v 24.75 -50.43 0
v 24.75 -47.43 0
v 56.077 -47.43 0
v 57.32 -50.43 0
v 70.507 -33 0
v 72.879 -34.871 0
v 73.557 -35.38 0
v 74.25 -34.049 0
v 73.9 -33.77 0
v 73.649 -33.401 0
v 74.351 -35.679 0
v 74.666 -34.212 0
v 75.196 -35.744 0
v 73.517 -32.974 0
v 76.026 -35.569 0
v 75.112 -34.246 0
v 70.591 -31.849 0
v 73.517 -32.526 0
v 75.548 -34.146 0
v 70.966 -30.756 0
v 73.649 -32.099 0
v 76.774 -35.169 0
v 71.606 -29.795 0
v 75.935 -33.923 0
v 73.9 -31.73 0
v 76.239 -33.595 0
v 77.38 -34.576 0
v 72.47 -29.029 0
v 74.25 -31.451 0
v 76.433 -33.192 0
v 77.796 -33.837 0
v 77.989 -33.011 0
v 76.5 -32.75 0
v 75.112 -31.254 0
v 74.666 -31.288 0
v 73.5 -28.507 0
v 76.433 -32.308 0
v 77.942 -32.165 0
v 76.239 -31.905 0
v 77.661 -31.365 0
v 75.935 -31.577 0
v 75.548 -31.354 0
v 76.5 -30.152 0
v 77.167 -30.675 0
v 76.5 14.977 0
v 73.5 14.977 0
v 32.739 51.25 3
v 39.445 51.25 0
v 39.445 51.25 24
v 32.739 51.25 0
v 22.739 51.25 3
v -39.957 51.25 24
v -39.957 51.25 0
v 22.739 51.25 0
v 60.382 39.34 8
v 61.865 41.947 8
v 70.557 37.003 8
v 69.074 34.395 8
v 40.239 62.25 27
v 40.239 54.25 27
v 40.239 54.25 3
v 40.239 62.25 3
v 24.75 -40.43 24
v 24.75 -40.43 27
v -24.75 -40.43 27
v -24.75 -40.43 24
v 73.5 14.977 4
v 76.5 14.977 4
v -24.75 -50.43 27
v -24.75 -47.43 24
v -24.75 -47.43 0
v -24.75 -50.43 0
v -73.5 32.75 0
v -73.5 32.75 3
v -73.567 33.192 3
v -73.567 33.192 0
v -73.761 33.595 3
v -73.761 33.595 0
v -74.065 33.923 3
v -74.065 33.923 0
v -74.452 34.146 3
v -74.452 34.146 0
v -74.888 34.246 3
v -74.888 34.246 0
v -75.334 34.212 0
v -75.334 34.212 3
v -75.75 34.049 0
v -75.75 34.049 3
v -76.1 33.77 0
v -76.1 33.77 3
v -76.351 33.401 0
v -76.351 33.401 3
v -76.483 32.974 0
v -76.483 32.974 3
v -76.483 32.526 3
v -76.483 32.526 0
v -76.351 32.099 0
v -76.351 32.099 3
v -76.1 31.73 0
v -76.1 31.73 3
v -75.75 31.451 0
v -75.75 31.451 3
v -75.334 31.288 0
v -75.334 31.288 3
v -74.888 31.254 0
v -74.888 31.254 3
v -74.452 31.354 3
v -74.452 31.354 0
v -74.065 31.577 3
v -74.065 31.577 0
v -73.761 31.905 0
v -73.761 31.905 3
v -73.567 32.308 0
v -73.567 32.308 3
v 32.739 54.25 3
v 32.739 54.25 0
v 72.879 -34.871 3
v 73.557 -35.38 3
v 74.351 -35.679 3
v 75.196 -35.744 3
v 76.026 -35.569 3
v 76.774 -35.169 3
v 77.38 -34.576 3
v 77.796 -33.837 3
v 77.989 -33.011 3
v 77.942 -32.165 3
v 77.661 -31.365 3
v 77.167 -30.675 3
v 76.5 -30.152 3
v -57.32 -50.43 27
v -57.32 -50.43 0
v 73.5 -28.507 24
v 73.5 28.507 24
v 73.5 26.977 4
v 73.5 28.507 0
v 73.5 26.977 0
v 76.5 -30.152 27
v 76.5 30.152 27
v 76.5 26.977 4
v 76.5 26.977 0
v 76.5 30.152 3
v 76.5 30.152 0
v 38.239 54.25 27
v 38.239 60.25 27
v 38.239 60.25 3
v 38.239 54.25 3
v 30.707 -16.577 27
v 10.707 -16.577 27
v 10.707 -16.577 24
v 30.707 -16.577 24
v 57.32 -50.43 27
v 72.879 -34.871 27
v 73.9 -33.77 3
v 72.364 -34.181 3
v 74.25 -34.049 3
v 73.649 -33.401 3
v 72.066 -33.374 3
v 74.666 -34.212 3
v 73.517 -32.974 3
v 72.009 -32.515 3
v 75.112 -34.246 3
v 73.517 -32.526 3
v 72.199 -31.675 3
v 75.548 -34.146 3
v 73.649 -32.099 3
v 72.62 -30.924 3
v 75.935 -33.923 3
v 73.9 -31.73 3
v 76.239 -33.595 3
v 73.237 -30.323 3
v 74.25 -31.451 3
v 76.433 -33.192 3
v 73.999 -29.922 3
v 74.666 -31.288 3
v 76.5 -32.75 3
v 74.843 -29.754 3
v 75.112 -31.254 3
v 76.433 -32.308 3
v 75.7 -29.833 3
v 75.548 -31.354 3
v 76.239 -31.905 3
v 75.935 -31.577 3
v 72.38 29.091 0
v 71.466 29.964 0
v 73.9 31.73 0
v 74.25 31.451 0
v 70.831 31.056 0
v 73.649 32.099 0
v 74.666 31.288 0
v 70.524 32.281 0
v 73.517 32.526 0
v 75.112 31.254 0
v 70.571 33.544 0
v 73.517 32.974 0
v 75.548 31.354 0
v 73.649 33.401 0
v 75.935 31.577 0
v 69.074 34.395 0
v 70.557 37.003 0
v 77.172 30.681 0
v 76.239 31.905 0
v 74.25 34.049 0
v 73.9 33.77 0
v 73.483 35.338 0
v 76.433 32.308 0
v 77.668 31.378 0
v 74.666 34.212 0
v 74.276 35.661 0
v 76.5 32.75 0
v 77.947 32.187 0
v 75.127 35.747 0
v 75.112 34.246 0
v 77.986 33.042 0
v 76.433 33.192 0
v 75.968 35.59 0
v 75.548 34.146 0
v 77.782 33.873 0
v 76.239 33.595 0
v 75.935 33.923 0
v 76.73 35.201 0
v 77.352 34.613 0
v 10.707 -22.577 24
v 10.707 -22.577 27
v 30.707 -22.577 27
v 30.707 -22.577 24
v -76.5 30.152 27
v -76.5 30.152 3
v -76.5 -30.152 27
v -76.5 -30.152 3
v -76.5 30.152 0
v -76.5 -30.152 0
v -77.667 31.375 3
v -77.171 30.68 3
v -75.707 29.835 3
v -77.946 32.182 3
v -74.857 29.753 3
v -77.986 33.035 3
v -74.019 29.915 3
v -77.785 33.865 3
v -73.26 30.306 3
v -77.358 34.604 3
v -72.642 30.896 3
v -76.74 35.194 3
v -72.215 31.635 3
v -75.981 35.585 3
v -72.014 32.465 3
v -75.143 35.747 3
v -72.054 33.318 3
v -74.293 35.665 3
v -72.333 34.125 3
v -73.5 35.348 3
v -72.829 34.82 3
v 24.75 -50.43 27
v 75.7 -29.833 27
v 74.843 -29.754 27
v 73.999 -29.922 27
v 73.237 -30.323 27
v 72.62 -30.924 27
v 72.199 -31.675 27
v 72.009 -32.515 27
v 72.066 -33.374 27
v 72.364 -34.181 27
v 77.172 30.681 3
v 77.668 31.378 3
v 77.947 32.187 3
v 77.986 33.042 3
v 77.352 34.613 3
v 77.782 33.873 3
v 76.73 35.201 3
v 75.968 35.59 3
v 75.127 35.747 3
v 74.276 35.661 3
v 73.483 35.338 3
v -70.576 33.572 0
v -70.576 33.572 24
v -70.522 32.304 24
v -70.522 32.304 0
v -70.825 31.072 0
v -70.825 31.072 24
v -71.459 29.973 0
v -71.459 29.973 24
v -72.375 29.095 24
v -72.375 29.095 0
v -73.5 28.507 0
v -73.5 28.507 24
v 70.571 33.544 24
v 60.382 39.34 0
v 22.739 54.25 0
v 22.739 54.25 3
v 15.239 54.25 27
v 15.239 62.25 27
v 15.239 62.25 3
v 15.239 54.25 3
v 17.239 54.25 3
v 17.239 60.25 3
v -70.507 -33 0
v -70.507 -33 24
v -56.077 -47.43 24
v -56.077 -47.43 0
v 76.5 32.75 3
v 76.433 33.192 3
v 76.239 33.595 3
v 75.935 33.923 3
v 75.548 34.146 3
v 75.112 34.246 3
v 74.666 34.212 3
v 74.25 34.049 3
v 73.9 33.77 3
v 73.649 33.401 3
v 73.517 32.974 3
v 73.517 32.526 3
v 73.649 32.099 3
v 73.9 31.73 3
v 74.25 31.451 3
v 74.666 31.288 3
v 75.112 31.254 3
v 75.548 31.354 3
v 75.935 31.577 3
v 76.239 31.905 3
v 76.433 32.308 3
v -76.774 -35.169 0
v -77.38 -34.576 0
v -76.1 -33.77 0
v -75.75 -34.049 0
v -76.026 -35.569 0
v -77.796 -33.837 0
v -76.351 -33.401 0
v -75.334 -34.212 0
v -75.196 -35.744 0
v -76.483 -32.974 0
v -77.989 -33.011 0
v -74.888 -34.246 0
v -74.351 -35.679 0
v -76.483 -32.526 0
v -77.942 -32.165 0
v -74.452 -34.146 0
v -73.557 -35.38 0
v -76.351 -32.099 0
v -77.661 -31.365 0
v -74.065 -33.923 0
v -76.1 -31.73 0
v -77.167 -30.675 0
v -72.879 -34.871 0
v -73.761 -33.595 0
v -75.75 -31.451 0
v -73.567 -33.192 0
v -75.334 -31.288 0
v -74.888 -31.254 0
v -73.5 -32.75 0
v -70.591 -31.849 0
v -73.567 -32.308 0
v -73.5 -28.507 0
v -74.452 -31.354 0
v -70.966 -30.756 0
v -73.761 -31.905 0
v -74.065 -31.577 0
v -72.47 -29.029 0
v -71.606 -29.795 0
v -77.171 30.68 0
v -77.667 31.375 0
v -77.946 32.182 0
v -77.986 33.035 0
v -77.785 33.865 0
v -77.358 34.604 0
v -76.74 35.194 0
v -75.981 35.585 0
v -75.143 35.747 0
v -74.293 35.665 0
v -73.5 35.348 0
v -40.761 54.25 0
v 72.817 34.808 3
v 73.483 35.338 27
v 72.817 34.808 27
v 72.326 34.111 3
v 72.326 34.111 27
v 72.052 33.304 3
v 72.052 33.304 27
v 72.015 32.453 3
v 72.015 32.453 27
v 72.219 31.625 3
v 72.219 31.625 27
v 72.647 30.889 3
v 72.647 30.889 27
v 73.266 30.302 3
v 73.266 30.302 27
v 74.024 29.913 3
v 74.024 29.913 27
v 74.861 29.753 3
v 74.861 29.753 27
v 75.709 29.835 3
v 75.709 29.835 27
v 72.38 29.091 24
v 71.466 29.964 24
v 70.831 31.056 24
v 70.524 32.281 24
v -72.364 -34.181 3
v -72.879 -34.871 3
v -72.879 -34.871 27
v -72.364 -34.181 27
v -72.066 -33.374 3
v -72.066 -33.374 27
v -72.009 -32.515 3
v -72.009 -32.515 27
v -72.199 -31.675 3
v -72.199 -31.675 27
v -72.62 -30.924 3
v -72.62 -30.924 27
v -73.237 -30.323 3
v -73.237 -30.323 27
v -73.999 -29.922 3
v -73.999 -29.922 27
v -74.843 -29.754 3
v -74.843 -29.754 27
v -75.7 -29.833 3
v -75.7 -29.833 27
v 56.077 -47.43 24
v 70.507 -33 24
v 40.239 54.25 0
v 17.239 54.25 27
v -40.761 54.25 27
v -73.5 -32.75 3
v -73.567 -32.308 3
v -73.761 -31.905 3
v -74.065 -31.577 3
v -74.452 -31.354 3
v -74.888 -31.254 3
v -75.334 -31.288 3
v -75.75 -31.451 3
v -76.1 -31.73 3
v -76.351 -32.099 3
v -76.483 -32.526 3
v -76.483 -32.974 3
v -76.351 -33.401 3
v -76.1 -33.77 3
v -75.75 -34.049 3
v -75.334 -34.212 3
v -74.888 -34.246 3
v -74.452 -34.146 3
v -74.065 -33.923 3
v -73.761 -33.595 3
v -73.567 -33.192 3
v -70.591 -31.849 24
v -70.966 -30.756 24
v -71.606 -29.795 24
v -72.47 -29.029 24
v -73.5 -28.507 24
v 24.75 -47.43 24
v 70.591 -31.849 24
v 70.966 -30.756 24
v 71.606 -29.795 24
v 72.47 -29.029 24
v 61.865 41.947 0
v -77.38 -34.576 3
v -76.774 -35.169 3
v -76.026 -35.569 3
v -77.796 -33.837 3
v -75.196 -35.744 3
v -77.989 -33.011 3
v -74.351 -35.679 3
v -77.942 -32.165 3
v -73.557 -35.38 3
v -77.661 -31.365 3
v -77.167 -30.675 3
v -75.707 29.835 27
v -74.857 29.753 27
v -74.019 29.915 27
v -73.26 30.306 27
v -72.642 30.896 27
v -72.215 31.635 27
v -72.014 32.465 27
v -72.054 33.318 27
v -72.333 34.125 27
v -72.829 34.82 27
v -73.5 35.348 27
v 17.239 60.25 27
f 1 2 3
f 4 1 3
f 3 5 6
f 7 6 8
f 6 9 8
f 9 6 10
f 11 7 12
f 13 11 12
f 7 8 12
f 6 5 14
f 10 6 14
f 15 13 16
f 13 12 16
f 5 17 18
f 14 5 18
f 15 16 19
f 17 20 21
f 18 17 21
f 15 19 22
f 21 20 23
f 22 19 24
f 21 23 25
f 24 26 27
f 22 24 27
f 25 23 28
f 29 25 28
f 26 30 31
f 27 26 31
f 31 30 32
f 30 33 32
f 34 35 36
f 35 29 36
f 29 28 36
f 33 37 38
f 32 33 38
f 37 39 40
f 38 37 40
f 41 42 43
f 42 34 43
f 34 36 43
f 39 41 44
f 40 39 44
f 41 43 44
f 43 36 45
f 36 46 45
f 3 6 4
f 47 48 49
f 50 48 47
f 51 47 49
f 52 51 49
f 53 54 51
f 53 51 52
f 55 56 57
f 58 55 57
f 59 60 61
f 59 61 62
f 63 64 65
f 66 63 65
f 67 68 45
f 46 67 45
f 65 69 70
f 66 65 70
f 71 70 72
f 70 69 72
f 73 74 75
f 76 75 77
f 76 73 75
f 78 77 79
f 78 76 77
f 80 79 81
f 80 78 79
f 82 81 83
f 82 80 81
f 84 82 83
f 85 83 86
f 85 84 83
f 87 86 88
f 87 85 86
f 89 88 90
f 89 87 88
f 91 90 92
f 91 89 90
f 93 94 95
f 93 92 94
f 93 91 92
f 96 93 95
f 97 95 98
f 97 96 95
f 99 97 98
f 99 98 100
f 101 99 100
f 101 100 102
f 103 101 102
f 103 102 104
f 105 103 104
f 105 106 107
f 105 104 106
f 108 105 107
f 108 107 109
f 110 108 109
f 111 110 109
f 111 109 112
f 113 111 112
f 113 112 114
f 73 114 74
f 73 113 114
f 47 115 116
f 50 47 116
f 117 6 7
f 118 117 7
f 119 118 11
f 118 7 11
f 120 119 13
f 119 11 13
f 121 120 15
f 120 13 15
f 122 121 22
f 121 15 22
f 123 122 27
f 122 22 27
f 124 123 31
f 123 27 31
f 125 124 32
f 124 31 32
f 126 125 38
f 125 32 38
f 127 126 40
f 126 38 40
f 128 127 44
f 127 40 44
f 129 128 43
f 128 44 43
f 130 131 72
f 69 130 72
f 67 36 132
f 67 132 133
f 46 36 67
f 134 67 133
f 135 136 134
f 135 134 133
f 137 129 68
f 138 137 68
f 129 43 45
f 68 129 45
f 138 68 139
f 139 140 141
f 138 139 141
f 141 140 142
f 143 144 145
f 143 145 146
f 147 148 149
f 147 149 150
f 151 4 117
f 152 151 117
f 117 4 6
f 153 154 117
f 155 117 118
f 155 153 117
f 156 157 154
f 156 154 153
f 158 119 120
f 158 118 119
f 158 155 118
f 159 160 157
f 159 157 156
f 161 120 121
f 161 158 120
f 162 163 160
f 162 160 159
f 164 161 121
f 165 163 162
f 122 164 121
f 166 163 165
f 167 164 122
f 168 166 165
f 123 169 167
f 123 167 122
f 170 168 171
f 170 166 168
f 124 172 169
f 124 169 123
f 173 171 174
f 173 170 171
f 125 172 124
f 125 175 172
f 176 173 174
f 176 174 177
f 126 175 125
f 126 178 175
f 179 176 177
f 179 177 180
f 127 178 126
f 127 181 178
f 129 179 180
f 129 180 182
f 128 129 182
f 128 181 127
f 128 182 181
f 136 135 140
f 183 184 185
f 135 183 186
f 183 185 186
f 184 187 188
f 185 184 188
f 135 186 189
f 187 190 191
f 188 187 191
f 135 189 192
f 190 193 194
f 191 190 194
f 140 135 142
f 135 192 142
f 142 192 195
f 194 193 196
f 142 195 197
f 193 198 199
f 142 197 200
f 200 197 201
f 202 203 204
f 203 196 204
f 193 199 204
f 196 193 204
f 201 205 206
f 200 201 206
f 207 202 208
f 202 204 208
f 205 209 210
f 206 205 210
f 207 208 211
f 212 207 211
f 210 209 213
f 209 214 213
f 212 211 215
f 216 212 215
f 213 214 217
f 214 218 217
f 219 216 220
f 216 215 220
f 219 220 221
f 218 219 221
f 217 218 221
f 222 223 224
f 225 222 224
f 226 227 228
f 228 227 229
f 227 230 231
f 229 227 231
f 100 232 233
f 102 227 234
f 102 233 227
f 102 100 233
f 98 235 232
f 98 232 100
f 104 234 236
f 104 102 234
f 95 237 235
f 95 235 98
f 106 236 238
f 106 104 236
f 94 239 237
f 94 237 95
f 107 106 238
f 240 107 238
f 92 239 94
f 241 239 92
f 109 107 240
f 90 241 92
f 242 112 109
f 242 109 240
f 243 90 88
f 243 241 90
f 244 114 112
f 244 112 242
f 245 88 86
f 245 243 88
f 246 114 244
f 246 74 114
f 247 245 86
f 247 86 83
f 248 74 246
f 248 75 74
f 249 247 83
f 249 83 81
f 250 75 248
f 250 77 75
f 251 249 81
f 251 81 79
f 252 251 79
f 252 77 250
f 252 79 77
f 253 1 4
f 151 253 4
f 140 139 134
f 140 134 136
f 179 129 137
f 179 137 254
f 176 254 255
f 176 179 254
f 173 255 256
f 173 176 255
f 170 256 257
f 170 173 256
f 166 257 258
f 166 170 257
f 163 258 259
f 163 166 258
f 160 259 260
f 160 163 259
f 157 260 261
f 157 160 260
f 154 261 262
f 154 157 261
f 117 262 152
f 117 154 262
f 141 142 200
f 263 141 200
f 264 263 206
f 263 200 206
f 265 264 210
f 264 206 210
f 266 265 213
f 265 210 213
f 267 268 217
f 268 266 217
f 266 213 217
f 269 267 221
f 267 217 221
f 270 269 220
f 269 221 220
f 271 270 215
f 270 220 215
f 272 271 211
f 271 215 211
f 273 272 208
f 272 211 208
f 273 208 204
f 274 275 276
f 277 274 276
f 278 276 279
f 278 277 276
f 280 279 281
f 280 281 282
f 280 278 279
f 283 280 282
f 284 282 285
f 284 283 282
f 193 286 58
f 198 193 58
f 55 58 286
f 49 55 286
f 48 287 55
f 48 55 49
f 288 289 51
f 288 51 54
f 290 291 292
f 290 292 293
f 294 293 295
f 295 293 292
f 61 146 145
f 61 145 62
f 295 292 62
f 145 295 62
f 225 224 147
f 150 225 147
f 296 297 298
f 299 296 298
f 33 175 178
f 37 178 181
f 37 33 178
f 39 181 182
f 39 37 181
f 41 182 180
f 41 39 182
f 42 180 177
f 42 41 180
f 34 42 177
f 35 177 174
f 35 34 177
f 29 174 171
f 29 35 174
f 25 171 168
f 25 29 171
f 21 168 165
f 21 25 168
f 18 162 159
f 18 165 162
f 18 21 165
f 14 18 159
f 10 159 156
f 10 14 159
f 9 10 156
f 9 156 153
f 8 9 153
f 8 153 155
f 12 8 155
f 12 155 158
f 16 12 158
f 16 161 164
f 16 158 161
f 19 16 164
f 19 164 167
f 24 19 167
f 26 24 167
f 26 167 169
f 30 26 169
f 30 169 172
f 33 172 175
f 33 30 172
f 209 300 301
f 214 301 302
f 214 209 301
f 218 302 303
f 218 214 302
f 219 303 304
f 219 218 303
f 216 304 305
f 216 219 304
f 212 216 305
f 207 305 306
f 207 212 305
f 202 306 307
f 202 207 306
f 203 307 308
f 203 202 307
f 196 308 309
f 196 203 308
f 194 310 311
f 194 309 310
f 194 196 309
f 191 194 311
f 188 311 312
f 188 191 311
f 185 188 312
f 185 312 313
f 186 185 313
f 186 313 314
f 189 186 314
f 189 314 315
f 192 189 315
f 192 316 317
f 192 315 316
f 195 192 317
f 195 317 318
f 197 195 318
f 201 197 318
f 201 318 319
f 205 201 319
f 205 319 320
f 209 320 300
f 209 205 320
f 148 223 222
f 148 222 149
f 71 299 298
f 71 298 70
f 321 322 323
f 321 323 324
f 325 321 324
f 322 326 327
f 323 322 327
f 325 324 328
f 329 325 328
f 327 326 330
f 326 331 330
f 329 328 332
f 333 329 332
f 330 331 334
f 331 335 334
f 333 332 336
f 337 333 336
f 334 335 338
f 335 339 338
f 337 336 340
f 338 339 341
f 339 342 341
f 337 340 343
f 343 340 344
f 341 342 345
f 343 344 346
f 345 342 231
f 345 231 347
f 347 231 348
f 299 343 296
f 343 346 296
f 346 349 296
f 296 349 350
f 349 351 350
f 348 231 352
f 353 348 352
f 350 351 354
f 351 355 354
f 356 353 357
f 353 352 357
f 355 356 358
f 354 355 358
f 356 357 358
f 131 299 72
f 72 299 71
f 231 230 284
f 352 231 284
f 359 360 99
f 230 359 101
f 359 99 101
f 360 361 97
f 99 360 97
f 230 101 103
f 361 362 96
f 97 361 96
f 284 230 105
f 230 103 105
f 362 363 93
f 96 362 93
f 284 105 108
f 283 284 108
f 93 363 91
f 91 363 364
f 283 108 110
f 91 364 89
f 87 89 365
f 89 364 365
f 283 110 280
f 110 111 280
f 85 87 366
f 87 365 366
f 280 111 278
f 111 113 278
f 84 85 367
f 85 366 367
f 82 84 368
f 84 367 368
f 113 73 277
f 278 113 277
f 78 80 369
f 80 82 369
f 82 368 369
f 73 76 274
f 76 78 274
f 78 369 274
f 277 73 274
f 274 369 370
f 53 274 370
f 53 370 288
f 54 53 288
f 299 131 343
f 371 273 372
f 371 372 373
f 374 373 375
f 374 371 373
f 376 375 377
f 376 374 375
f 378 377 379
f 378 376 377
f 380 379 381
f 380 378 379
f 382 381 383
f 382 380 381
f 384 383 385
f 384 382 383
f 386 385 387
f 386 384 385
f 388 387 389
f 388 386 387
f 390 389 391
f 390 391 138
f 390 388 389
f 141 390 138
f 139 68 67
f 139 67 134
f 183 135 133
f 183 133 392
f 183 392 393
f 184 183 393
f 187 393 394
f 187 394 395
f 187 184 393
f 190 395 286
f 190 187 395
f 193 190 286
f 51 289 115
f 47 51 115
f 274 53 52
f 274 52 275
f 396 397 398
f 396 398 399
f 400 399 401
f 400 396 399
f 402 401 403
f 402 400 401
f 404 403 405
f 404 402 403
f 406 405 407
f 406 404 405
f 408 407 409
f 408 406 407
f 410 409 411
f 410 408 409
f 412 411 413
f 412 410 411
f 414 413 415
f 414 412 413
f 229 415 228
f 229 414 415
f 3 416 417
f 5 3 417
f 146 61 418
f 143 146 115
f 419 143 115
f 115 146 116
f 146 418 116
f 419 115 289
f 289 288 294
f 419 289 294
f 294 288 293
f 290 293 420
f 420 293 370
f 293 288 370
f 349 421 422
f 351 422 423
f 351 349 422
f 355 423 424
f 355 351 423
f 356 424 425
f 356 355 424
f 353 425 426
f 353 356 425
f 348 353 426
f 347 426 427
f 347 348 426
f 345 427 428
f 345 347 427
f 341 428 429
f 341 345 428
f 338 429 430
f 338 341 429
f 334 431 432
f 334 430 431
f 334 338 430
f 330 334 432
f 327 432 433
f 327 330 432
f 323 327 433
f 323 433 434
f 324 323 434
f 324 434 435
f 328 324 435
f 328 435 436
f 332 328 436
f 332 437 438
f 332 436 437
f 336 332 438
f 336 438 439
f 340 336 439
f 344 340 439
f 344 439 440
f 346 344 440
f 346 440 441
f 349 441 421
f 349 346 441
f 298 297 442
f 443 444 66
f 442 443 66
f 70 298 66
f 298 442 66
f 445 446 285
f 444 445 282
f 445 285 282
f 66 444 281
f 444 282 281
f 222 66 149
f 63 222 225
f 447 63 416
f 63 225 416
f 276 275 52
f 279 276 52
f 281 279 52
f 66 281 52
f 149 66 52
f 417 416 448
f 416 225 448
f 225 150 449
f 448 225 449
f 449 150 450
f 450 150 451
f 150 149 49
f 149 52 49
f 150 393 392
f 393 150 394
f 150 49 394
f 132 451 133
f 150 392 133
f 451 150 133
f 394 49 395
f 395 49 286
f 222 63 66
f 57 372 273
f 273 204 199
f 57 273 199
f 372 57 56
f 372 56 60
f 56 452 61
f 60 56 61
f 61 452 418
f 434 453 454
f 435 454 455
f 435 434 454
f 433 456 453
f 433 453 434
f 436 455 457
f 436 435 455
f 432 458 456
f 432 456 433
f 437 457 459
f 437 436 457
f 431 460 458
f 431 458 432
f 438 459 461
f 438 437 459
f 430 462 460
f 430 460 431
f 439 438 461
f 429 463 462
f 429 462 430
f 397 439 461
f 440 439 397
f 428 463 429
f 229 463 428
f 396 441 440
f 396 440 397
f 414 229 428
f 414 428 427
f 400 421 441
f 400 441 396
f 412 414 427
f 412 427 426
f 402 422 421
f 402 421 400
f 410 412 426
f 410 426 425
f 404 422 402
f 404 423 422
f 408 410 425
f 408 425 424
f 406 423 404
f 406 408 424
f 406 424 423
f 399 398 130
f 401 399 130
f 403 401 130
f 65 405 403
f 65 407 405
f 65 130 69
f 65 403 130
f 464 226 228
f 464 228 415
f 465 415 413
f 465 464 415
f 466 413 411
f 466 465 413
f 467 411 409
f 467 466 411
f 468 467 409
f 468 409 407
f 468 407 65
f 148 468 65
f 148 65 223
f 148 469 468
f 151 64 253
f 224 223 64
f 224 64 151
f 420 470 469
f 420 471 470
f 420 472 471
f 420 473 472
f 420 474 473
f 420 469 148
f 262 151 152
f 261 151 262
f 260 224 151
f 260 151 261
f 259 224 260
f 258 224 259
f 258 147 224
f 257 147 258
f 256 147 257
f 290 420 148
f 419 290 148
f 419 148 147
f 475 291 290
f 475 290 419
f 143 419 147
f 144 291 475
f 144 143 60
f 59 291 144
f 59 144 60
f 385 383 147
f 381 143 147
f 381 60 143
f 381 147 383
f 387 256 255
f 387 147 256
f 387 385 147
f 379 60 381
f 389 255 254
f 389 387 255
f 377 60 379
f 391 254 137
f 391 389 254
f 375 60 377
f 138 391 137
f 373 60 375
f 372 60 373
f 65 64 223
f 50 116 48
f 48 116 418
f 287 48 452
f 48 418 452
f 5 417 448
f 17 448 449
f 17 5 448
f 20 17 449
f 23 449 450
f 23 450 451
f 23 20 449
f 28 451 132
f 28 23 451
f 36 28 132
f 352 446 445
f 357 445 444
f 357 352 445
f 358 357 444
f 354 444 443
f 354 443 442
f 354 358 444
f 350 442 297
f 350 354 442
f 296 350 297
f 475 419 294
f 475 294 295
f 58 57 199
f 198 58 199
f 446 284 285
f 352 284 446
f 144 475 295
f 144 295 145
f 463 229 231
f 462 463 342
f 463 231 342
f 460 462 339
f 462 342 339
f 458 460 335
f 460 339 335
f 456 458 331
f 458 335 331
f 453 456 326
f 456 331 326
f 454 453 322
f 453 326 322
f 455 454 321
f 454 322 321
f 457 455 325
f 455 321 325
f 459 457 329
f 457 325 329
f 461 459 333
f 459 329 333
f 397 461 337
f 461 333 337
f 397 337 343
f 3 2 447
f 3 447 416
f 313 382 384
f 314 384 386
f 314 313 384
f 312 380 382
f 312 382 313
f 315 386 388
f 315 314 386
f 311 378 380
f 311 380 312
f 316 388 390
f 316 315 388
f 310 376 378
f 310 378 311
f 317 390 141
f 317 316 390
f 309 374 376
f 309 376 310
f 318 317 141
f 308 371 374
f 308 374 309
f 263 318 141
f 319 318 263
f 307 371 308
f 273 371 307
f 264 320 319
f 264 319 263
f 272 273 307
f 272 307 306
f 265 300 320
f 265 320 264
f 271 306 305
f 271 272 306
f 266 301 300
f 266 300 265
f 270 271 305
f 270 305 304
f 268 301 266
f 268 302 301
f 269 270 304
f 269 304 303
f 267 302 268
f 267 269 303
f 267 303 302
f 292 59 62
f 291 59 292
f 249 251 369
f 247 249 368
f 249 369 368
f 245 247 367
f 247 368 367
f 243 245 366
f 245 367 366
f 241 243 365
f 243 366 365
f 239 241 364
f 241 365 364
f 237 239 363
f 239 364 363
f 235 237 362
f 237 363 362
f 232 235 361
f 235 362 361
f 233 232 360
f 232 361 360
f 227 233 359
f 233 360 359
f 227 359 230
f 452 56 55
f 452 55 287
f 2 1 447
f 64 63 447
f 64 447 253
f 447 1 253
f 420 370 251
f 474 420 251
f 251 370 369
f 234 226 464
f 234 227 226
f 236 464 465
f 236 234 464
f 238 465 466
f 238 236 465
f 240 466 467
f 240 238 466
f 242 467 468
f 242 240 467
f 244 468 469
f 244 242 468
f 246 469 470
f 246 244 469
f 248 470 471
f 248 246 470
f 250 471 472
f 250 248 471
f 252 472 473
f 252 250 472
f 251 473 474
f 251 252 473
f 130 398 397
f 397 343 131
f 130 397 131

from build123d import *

# Parameters (mm, degrees)
SKETCH_2_R          = 1.5
EXTRUDE_1_DEPTH     = 27
SHELL_1_DEPTH       = 24
CUT_EXTRUDE_START   = -24
SKETCH_3_R          = 3
CUT_EXTRUDE_1_DEPTH = 24
SKETCH_5_W          = 20
SKETCH_5_H          = 6
CUT_EXTRUDE_3_DEPTH = 32
SKETCH_6_W          = 4
SKETCH_6_H          = 12
CUT_EXTRUDE_4_DEPTH = 32
SKETCH_7_W          = 10
SKETCH_7_H          = 8
CUT_EXTRUDE_5_DEPTH = 32
EXTRUDE_2_DEPTH     = 24
SKETCH_9_W          = 10
SKETCH_9_H          = 3
CUT_EXTRUDE_6_DEPTH = 24
SKETCH_10_R         = 1.35
CUT_EXTRUDE_7_DEPTH = 10
CUT_EXTRUDE_8_DEPTH = 10
CUT_EXTRUDE_9_DEPTH = 10


# Read off the part's stored shape, not the designer's step: 抽壳1
with BuildPart() as part:
    # 草图2 → 凸台-拉伸1 (new body)
    with BuildSketch(Plane.XY):
        with BuildLine():
            Line((-76.5, 30.151923789), (-76.5, -30.151923789))
            ThreePointArc((-76.5, -30.151923789), (-77.380060021, -34.576284287), (-72.878679656, -34.871320344))
            Line((-72.878679656, -34.871320344), (-57.32, -50.43))
            Line((-57.32, -50.43), (57.32, -50.43))
            Line((57.32, -50.43), (72.878679656, -34.871320344))
            ThreePointArc((72.878679656, -34.871320344), (77.380060021, -34.576284287), (76.5, -30.151923789))
            Line((76.5, -30.151923789), (76.5, 30.151923789))
            ThreePointArc((76.5, 30.151923789), (77.593259199, 34.258312544), (73.483390382, 35.33841559))
            Line((73.483390382, 35.33841559), (40.238526366, 54.25))
            Line((40.238526366, 54.25), (-40.760907637, 54.25))
            Line((-40.760907637, 54.25), (-73.5, 35.348076211))
            ThreePointArc((-73.5, 35.348076211), (-77.598076211, 34.25), (-76.5, 30.151923789))
        make_face()
        with Locations((-75, 32.75)):
            Circle(SKETCH_2_R, mode=Mode.SUBTRACT)
        with Locations((75, 32.75)):
            Circle(SKETCH_2_R, mode=Mode.SUBTRACT)
        with Locations((75, -32.75)):
            Circle(SKETCH_2_R, mode=Mode.SUBTRACT)
        with Locations((-75, -32.75)):
            Circle(SKETCH_2_R, mode=Mode.SUBTRACT)
    extrude(amount=EXTRUDE_1_DEPTH)

    # 抽壳1 outline → 抽壳1 (cut)
    with BuildSketch(Plane.XY):
        with BuildLine():
            Line((-73.5, 28.507359313), (-73.5, -28.507359313))
            ThreePointArc((-73.5, -28.507359313), (-71.254879923, -30.255190266), (-70.506971411, -33.000387902))
            Line((-70.506971411, -33.000387902), (-56.077359313, -47.43))
            Line((-56.077359313, -47.43), (56.077359313, -47.43))
            Line((56.077359313, -47.43), (70.506971411, -33.000387902))
            ThreePointArc((70.506971411, -33.000387902), (71.254879923, -30.255190266), (73.5, -28.507359313))
            Line((73.5, -28.507359313), (73.5, 28.507359313))
            ThreePointArc((73.5, 28.507359313), (71.110106029, 30.48754008), (70.570593139, 33.543948905))
            Line((70.570593139, 33.543948905), (39.444948236, 51.25))
            Line((39.444948236, 51.25), (-39.95706006, 51.25))
            Line((-39.95706006, 51.25), (-70.575765386, 33.572282238))
            ThreePointArc((-70.575765386, 33.572282238), (-71.102885683, 30.5), (-73.5, 28.507359313))
        make_face()
    extrude(amount=SHELL_1_DEPTH, mode=Mode.SUBTRACT)

    # 草图3 → 切除-拉伸1 (cut)
    with BuildSketch(Plane.XY.offset(27).offset(CUT_EXTRUDE_START)):
        with Locations((75, 32.75)):
            Circle(SKETCH_3_R)
        with Locations((75, -32.75)):
            Circle(SKETCH_3_R)
        with Locations((-75, -32.75)):
            Circle(SKETCH_3_R)
        with Locations((-75, 32.75)):
            Circle(SKETCH_3_R)
    extrude(amount=CUT_EXTRUDE_1_DEPTH, mode=Mode.SUBTRACT)

    # 草图5 → 切除-拉伸3 (cut)
    with BuildSketch(Plane.XY.offset(27)):
        with Locations((20.7074416, -19.577067137)):
            Rectangle(SKETCH_5_W, SKETCH_5_H)
    extrude(amount=-CUT_EXTRUDE_3_DEPTH, mode=Mode.SUBTRACT)

    # 草图6 → 切除-拉伸4 (cut)
    with BuildSketch(Plane(origin=(76.5, 0, 0), x_dir=(0, 0, -1), z_dir=(1, 0, 0))):
        with Locations((-2, 20.977362477)):
            Rectangle(SKETCH_6_W, SKETCH_6_H)
    extrude(amount=-CUT_EXTRUDE_4_DEPTH, mode=Mode.SUBTRACT)

    # 草图7 → 切除-拉伸5 (cut)
    with BuildSketch(Plane(origin=(33.153284591, 58.280491682, 0), x_dir=(0.8692042501767389, -0.4944532045347601, 0), z_dir=(0.4944532045347601, 0.8692042501767389, 0))):
        with Locations((38.03253292, -4)):
            Rectangle(SKETCH_7_W, SKETCH_7_H)
    extrude(amount=-CUT_EXTRUDE_5_DEPTH, mode=Mode.SUBTRACT)

    # 草图8 → 凸台-拉伸2 (add)
    with BuildSketch(Plane.XY.offset(27)):
        Polygon((40.238526366, 54.25), (40.238526366, 62.25), (15.238526366, 62.25), (15.238526366, 54.25), (17.238526366, 54.25), (17.238526366, 60.25), (38.238526366, 60.25), (38.238526366, 54.25), align=None)
    extrude(amount=-EXTRUDE_2_DEPTH)

    # 草图9 → 切除-拉伸6 (cut)
    with BuildSketch(Plane(origin=(0, 54.25, 0), x_dir=(1, 0, 0), z_dir=(0, 1, 0))):
        with Locations((27.738526366, -1.5)):
            Rectangle(SKETCH_9_W, SKETCH_9_H)
    extrude(amount=-CUT_EXTRUDE_6_DEPTH, mode=Mode.SUBTRACT)

    # 草图10 → 切除-拉伸7 (cut)
    with BuildSketch(Plane.XZ.offset(50.43)):
        with Locations((-18.75, 20)):
            Circle(SKETCH_10_R)
        with Locations((18.75, 20)):
            Circle(SKETCH_10_R)
    extrude(amount=-CUT_EXTRUDE_7_DEPTH, mode=Mode.SUBTRACT)

    # 草图11 → 切除-拉伸8 (cut)
    with BuildSketch(Plane.XZ.offset(50.43)):
        Polygon((0, 3), (2, 3), (2, 0), (-2, 0), (-2, 3), align=None)
    extrude(amount=-CUT_EXTRUDE_8_DEPTH, mode=Mode.SUBTRACT)

    # 草图12 → 切除-拉伸9 (cut)
    with BuildSketch(Plane.XZ.offset(50.43)):
        Polygon((-24.75, 20), (-24.75, 27), (24.75, 27), (24.75, 20), (24.75, 0), (-24.75, 0), align=None)
    extrude(amount=-CUT_EXTRUDE_9_DEPTH, mode=Mode.SUBTRACT)


solid = part.part
